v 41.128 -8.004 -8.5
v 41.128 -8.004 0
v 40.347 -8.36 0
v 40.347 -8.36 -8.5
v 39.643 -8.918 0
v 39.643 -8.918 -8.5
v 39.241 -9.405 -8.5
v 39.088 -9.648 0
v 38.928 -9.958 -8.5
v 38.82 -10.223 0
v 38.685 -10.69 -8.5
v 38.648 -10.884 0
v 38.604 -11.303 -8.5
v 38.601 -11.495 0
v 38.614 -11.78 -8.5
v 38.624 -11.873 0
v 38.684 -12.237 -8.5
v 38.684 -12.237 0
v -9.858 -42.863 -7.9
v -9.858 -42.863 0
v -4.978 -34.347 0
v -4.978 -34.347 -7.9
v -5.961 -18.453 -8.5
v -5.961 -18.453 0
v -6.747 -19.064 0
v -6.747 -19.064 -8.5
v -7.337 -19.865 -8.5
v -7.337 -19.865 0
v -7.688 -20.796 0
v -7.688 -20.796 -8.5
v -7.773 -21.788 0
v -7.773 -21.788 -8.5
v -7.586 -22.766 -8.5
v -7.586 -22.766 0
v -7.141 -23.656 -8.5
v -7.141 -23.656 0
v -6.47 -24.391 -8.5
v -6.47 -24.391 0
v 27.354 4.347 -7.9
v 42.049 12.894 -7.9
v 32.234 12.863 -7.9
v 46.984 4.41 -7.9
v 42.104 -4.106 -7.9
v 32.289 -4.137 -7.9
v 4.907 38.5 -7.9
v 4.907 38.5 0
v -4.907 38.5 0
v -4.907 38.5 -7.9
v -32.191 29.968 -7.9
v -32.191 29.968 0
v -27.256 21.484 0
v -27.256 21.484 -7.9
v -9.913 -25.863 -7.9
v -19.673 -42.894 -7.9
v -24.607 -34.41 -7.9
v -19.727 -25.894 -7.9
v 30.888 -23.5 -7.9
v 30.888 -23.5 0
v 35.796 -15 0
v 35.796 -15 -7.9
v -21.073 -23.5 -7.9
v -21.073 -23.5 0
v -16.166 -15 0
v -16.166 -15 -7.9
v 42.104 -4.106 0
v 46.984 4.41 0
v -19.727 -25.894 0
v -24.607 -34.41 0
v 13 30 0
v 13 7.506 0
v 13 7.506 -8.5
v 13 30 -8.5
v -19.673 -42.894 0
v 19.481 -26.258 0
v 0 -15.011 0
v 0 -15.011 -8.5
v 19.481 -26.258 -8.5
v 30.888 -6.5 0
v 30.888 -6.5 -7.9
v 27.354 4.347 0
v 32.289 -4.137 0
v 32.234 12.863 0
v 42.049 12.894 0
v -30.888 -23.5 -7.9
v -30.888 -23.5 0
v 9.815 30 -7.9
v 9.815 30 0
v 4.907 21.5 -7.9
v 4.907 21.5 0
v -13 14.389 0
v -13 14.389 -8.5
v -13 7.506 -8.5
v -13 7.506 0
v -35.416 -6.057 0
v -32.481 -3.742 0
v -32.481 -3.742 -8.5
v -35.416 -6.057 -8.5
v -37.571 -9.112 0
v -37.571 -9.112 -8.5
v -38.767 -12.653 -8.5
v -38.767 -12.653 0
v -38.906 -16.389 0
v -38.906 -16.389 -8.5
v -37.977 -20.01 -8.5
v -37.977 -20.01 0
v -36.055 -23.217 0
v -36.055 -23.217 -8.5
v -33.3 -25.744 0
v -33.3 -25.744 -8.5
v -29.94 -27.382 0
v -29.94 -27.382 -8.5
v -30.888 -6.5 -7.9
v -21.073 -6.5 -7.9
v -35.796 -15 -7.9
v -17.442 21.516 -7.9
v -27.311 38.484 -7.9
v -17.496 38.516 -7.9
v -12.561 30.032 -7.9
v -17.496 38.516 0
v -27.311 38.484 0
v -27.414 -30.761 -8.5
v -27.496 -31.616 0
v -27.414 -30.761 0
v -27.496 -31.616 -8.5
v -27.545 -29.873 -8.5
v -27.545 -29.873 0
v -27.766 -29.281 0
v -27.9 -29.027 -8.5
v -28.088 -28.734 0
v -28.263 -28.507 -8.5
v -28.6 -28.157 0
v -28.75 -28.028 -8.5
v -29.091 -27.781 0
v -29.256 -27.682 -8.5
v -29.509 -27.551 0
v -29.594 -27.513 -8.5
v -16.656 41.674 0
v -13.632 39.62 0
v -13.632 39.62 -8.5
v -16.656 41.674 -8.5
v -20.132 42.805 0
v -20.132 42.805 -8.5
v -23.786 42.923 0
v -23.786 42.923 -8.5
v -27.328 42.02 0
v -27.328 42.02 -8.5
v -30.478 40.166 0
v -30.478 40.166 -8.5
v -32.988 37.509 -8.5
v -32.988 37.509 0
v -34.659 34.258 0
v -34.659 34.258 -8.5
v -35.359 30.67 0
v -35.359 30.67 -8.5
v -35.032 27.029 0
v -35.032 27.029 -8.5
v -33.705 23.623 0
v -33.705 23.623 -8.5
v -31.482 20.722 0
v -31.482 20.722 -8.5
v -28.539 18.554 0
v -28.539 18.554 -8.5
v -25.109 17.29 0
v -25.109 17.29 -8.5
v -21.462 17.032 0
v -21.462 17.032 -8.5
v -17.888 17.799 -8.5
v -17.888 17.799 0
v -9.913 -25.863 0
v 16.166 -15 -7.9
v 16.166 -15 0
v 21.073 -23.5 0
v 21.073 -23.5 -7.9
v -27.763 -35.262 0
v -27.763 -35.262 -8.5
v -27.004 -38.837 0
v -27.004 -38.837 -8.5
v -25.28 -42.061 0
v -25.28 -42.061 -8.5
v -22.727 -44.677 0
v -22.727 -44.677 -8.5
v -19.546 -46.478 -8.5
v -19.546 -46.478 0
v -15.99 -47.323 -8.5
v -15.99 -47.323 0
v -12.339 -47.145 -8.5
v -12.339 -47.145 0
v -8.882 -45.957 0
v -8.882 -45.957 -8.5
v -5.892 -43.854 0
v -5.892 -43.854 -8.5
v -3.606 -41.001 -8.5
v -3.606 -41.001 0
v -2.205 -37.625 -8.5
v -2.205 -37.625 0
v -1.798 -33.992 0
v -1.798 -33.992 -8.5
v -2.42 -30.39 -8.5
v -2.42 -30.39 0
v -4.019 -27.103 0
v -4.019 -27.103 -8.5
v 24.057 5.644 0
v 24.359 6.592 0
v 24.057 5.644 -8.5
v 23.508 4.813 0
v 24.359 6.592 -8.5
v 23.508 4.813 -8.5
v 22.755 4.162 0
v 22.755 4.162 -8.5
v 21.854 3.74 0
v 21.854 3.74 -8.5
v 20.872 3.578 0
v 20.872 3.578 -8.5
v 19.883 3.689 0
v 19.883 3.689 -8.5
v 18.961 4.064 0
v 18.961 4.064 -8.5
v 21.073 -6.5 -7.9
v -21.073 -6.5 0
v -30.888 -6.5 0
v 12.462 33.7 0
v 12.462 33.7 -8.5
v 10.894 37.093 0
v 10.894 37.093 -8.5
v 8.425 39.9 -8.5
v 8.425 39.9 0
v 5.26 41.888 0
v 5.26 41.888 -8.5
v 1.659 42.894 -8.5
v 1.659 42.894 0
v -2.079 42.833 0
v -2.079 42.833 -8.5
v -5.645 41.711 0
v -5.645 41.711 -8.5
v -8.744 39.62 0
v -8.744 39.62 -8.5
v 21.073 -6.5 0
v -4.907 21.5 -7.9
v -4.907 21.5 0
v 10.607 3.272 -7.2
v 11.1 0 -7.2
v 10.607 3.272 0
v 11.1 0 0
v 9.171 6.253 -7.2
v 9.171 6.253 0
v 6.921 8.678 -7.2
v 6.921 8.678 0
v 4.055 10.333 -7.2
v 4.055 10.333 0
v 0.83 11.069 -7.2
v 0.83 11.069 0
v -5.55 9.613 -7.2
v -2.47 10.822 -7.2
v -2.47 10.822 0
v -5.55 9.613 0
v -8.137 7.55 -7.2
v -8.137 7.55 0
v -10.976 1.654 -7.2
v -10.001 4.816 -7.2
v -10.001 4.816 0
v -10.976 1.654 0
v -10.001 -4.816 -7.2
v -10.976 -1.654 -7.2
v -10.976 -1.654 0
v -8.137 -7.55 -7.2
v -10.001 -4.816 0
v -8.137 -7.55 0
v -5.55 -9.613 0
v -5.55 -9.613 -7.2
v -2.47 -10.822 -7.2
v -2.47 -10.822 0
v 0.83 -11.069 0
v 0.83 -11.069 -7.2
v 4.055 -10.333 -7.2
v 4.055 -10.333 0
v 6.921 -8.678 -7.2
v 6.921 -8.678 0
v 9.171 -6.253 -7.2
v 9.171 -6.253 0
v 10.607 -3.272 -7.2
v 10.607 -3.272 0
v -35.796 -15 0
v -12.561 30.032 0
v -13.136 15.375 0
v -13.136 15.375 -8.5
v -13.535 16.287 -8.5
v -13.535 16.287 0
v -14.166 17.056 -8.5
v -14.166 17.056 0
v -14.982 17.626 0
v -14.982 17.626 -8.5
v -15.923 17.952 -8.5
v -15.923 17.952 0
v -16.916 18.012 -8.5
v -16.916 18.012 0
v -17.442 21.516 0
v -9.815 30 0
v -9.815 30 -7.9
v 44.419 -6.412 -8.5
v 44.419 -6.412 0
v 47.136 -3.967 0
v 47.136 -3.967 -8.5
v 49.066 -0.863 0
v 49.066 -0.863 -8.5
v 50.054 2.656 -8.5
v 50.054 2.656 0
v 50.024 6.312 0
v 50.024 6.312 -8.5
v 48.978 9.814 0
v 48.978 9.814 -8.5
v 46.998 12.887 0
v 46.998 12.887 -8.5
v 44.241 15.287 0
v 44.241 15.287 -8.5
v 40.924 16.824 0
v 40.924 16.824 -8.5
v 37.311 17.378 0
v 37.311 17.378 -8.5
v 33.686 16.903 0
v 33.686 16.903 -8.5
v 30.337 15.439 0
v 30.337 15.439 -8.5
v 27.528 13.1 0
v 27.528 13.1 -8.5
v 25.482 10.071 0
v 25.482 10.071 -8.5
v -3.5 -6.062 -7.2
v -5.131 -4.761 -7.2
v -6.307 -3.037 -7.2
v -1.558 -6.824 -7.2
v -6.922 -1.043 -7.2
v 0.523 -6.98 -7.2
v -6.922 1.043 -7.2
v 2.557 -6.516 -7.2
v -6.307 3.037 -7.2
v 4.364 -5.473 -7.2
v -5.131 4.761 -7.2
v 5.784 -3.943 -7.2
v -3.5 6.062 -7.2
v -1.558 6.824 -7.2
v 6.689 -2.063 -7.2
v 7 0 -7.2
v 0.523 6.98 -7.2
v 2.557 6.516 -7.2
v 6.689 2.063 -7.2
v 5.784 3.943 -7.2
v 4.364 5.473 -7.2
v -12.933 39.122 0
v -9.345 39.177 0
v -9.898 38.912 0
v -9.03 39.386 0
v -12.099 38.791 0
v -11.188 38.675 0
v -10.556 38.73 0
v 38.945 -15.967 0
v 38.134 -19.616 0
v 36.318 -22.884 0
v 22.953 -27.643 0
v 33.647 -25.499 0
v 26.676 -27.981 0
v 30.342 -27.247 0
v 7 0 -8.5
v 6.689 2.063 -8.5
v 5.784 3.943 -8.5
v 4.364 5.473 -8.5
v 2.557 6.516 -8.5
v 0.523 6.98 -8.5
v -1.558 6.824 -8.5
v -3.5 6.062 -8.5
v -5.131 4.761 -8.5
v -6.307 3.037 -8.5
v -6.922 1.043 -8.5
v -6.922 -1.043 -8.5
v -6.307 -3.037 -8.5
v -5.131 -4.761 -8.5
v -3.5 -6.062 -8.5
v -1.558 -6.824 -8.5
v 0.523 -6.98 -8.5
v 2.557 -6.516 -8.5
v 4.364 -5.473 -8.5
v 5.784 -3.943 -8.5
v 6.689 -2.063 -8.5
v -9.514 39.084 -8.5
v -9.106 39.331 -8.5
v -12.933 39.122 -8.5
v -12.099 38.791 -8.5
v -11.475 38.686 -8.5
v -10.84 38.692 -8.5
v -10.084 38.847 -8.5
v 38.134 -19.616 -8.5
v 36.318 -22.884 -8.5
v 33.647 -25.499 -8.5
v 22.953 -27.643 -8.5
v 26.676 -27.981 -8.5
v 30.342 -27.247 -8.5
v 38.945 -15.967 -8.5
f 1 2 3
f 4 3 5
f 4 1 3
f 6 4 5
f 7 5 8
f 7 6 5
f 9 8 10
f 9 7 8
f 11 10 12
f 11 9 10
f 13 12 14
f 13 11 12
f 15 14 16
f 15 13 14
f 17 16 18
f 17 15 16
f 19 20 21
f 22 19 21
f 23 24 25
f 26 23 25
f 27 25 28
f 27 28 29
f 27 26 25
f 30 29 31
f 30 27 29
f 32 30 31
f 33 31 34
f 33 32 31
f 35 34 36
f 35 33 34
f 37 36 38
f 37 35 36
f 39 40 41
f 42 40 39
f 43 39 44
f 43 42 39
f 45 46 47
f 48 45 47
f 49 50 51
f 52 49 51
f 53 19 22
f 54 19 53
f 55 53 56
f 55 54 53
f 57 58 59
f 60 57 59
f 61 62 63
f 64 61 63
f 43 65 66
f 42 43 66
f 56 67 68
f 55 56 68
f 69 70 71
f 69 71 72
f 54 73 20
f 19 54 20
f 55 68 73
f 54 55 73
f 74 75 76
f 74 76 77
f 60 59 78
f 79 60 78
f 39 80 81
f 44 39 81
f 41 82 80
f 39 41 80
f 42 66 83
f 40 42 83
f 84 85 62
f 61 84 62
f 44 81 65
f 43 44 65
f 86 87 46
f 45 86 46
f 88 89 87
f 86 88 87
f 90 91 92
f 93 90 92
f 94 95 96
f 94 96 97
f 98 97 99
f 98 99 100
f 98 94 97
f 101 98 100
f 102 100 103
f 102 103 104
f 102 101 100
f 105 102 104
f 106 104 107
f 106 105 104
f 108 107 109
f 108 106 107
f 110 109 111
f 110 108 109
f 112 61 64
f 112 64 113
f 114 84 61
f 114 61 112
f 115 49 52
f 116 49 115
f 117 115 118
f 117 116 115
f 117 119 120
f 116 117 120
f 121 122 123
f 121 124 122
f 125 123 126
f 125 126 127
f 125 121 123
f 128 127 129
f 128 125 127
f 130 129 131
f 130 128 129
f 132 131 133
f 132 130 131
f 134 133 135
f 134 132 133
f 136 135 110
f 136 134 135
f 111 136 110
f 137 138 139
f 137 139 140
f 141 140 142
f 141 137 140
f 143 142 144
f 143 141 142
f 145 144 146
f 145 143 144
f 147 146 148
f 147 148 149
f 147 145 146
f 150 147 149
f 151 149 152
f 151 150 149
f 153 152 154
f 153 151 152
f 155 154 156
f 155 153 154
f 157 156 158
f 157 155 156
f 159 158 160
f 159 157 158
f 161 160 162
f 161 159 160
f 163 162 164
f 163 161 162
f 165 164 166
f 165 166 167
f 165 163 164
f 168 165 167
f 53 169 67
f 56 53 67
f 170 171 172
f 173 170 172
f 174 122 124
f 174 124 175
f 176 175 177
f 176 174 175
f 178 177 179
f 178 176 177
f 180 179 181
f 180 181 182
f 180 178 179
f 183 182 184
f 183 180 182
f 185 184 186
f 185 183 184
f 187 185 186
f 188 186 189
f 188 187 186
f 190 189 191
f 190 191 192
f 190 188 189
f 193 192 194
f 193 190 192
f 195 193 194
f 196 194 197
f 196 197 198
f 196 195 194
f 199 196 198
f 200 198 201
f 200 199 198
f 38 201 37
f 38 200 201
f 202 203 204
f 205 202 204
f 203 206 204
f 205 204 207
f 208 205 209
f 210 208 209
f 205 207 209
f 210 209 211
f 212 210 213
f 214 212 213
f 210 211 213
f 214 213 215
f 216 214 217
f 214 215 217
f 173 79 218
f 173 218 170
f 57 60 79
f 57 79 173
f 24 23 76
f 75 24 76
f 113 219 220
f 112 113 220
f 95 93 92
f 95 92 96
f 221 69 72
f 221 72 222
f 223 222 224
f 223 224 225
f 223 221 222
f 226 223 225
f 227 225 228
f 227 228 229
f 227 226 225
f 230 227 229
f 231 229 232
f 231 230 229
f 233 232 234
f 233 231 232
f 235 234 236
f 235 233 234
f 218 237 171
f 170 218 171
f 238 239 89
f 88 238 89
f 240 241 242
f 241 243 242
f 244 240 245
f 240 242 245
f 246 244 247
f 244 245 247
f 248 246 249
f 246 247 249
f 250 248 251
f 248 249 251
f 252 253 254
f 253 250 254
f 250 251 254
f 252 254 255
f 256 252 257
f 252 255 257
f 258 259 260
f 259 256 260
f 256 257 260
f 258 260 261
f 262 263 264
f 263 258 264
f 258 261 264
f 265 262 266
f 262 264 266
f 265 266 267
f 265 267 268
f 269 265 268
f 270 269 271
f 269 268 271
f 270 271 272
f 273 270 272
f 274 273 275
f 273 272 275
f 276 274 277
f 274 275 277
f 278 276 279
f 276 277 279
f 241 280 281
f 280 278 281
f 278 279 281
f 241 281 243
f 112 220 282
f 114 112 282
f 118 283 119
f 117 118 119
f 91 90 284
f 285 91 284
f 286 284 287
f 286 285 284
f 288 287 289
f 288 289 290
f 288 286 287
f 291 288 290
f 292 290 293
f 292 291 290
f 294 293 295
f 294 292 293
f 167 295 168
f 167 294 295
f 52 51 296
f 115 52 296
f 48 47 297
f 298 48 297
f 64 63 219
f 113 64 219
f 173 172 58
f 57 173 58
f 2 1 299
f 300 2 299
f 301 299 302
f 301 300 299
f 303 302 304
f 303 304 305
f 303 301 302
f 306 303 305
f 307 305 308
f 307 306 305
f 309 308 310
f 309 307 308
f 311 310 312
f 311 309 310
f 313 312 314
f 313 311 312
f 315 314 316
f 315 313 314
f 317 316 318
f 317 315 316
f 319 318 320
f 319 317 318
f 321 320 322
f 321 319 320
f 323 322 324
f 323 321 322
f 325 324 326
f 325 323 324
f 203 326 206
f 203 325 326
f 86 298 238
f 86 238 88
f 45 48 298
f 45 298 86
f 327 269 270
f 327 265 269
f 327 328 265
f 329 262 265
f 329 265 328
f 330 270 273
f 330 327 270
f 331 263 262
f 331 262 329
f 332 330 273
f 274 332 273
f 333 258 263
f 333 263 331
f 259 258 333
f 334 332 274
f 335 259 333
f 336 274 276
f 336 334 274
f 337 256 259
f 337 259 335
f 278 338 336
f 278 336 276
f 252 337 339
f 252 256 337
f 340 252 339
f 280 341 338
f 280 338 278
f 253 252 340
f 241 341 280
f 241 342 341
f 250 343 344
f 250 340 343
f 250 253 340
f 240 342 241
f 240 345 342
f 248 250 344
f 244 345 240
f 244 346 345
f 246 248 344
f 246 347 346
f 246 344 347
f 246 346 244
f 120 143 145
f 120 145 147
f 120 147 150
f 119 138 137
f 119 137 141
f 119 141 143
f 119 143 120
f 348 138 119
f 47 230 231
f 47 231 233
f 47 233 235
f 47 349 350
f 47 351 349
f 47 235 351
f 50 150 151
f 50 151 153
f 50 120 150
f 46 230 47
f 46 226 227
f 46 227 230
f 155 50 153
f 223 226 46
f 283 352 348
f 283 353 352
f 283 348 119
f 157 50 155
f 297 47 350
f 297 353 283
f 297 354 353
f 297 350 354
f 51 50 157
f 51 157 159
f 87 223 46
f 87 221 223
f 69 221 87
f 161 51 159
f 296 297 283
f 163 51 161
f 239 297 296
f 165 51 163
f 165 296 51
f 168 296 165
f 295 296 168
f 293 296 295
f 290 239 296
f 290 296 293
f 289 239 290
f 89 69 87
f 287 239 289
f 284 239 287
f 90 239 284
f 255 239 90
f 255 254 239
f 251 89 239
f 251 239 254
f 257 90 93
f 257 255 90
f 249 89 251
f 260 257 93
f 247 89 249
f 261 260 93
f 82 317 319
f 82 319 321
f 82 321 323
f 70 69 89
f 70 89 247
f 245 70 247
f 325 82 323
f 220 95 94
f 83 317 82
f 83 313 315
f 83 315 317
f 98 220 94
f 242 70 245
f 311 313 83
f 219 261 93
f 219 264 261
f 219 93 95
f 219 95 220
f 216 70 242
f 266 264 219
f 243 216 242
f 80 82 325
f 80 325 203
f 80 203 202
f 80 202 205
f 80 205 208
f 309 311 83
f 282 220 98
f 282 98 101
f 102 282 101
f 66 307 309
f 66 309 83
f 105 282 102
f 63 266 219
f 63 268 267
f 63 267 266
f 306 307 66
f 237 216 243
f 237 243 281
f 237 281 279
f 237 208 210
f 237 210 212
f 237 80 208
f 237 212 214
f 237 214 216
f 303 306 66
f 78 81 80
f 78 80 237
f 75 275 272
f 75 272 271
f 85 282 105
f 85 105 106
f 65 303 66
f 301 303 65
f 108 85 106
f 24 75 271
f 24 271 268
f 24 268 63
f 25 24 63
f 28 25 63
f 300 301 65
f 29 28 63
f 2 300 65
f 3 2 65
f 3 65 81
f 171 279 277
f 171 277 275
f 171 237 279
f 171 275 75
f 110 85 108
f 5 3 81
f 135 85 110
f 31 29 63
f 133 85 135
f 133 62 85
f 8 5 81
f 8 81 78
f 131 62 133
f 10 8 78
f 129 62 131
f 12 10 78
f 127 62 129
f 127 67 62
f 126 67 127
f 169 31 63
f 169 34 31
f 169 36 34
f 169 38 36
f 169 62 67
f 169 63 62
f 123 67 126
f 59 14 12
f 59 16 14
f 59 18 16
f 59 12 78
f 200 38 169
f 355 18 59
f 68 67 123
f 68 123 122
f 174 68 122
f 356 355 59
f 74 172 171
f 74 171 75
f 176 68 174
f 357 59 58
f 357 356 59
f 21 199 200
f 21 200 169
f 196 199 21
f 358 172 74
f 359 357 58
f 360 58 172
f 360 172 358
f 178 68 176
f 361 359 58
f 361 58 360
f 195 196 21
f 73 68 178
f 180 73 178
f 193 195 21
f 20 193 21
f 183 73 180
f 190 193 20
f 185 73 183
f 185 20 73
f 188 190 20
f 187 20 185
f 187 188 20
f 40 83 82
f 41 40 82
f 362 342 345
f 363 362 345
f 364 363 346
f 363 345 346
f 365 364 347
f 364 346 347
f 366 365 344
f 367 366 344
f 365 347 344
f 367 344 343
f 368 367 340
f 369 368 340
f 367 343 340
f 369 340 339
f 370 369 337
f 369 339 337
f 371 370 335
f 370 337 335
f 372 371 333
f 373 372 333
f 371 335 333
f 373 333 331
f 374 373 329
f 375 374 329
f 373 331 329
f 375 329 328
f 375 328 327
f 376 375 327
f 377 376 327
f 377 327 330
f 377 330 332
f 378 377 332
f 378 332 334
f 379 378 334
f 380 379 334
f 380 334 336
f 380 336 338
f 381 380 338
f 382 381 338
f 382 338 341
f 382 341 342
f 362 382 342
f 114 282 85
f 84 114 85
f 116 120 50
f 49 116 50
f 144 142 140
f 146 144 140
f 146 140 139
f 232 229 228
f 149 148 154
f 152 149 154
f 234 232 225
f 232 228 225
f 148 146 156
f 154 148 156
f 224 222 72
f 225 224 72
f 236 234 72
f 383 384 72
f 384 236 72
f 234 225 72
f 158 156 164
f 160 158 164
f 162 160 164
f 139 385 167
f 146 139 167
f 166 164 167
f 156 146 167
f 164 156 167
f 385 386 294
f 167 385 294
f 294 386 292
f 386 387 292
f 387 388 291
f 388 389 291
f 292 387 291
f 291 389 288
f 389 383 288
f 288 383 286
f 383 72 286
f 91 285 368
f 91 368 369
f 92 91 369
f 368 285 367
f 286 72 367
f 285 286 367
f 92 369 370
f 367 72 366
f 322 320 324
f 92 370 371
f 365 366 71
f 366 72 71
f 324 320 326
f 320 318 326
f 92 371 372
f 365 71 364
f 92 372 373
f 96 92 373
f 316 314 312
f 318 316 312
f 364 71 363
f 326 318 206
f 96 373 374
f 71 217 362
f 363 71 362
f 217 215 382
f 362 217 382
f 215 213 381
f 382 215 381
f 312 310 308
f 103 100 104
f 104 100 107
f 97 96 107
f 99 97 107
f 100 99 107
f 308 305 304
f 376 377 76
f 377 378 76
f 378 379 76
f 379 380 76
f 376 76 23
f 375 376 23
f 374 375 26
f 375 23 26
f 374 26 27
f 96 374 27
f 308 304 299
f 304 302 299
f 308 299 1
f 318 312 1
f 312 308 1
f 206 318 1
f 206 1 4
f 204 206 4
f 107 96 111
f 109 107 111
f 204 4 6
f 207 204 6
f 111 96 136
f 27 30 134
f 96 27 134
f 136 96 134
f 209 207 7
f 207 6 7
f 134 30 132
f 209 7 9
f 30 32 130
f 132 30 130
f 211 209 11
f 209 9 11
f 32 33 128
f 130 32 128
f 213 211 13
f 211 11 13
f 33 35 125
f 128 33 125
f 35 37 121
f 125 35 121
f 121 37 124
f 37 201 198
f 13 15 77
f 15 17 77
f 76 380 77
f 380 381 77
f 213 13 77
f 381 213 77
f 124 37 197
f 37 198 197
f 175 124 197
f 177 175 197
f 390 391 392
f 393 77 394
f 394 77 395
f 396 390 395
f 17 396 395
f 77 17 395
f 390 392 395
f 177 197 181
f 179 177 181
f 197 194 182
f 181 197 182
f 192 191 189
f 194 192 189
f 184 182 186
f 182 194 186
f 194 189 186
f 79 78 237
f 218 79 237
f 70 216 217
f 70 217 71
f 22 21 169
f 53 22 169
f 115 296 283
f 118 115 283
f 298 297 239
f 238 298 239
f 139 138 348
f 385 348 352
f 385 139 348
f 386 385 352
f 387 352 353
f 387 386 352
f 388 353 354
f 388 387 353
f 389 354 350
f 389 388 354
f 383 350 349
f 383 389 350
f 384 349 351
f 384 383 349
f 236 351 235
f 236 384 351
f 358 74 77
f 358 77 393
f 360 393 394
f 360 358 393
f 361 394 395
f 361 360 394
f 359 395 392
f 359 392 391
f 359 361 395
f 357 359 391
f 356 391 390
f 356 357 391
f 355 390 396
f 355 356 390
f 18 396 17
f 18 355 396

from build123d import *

# Parameters (mm, degrees)
F0_R     = 11.1
F0_R_2   = 7
F1_DEPTH = 8.5
F2_DEPTH = 7.9
F3_DEPTH = 7.2
F4_COUNT = 3
F5_R     = 3.6339158304


# Not quite as in the source:
# - a feature names something its author has since deleted; it is built from what else it names


with BuildPart() as f1:
    # F0 (on Top) → F1 (new body)
    with BuildSketch(Plane.XY):
        with BuildLine():
            ThreePointArc((-11.1881680787, 23.3799626101), (3.4317499164, 17.4611367137), (13, 30))
            ThreePointArc((13, 30), (3.4317499164, 42.5388632863), (-11.1881680787, 36.6200373899))
            ThreePointArc((-11.1881680787, 36.6200373899), (-35.2898051844, 31.4974370391), (-13, 20.9953167593))
            ThreePointArc((-13, 20.9953167593), (-12.0251844061, 22.1352903789), (-11.1881680787, 23.3799626101))
        make_face()
        Polygon((-17.4962580338, 38.5157601447), (-12.5614324777, 30.0316084449), (-17.4415106013, 21.5158483002), (-27.2564142809, 21.4842398553), (-32.1912398369, 29.9683915551), (-27.3111617133, 38.4841516998), align=None, mode=Mode.SUBTRACT)
        Polygon((4.9074772881, 38.5), (9.8149545762, 30), (4.9074772881, 21.5), (-4.9074772881, 21.5), (-9.8149545762, 30), (-4.9074772881, 38.5), align=None, mode=Mode.SUBTRACT)
        with BuildLine():
            ThreePointArc((-13, 0), (0, -13), (13, 0))
            ThreePointArc((13, 0), (0, 13), (-13, 0))
        make_face()
        Circle(F0_R, mode=Mode.SUBTRACT)
        Circle(F0_R)
        Circle(F0_R_2, mode=Mode.SUBTRACT)
        Polygon((4.9074772881, 21.5), (9.8149545762, 30), (4.9074772881, 38.5), (-4.9074772881, 38.5), (-9.8149545762, 30), (-4.9074772881, 21.5), align=None)
        Polygon((-17.4415106013, 21.5158483002), (-12.5614324777, 30.0316084449), (-17.4962580338, 38.5157601447), (-27.3111617133, 38.4841516998), (-32.1912398369, 29.9683915551), (-27.2564142809, 21.4842398553), align=None)
        with BuildLine():
            ThreePointArc((-13, 0), (0, 13), (13, 0))
            Line((13, 0), (13, 30))
            ThreePointArc((13, 30), (3.4317499164, 17.4611367137), (-11.1881680787, 23.3799626101))
            ThreePointArc((-11.1881680787, 23.3799626101), (-12.0251844061, 22.1352903789), (-13, 20.9953167593))
            Line((-13, 20.9953167593), (-13, 0))
        make_face()
    extrude(amount=-F1_DEPTH)

    # F0 (on Top) → F2 (cut)
    with BuildSketch(Plane.XY):
        Polygon((4.9074772881, 21.5), (9.8149545762, 30), (4.9074772881, 38.5), (-4.9074772881, 38.5), (-9.8149545762, 30), (-4.9074772881, 21.5), align=None)
        Polygon((-17.4415106013, 21.5158483002), (-12.5614324777, 30.0316084449), (-17.4962580338, 38.5157601447), (-27.3111617133, 38.4841516998), (-32.1912398369, 29.9683915551), (-27.2564142809, 21.4842398553), align=None)
    extrude(amount=-F2_DEPTH, mode=Mode.SUBTRACT)

    # F0 (on Top) → F3 (cut)
    with BuildSketch(Plane.XY):
        Circle(F0_R)
        Circle(F0_R_2, mode=Mode.SUBTRACT)
    extrude(amount=-F3_DEPTH, mode=Mode.SUBTRACT)

    # F4: F1 ×3 about axis
    f4_axis = Axis((0, 0, 0), (0, 0, 1))


with BuildPart() as f1_1:
    add(f1.part)
    for i in range(1, F4_COUNT):
        add(f1.part.rotate(f4_axis, i * 360 / F4_COUNT))

    # F5
    f5_edges = [f1_1.edges().sort_by_distance(p)[0] for p in [
        (-13, 20.995317, -4.25),
        (-11.188168, 36.620037, -4.25),
        (-11.682478, -21.755989, -4.25),
        (-26.119799, -27.999256, -4.25),
        (37.307967, -8.620781, -4.25),
        (24.682478, 0.760672, -4.25),
    ]]
    fillet(f5_edges, radius=F5_R)


solid = f1_1.part
